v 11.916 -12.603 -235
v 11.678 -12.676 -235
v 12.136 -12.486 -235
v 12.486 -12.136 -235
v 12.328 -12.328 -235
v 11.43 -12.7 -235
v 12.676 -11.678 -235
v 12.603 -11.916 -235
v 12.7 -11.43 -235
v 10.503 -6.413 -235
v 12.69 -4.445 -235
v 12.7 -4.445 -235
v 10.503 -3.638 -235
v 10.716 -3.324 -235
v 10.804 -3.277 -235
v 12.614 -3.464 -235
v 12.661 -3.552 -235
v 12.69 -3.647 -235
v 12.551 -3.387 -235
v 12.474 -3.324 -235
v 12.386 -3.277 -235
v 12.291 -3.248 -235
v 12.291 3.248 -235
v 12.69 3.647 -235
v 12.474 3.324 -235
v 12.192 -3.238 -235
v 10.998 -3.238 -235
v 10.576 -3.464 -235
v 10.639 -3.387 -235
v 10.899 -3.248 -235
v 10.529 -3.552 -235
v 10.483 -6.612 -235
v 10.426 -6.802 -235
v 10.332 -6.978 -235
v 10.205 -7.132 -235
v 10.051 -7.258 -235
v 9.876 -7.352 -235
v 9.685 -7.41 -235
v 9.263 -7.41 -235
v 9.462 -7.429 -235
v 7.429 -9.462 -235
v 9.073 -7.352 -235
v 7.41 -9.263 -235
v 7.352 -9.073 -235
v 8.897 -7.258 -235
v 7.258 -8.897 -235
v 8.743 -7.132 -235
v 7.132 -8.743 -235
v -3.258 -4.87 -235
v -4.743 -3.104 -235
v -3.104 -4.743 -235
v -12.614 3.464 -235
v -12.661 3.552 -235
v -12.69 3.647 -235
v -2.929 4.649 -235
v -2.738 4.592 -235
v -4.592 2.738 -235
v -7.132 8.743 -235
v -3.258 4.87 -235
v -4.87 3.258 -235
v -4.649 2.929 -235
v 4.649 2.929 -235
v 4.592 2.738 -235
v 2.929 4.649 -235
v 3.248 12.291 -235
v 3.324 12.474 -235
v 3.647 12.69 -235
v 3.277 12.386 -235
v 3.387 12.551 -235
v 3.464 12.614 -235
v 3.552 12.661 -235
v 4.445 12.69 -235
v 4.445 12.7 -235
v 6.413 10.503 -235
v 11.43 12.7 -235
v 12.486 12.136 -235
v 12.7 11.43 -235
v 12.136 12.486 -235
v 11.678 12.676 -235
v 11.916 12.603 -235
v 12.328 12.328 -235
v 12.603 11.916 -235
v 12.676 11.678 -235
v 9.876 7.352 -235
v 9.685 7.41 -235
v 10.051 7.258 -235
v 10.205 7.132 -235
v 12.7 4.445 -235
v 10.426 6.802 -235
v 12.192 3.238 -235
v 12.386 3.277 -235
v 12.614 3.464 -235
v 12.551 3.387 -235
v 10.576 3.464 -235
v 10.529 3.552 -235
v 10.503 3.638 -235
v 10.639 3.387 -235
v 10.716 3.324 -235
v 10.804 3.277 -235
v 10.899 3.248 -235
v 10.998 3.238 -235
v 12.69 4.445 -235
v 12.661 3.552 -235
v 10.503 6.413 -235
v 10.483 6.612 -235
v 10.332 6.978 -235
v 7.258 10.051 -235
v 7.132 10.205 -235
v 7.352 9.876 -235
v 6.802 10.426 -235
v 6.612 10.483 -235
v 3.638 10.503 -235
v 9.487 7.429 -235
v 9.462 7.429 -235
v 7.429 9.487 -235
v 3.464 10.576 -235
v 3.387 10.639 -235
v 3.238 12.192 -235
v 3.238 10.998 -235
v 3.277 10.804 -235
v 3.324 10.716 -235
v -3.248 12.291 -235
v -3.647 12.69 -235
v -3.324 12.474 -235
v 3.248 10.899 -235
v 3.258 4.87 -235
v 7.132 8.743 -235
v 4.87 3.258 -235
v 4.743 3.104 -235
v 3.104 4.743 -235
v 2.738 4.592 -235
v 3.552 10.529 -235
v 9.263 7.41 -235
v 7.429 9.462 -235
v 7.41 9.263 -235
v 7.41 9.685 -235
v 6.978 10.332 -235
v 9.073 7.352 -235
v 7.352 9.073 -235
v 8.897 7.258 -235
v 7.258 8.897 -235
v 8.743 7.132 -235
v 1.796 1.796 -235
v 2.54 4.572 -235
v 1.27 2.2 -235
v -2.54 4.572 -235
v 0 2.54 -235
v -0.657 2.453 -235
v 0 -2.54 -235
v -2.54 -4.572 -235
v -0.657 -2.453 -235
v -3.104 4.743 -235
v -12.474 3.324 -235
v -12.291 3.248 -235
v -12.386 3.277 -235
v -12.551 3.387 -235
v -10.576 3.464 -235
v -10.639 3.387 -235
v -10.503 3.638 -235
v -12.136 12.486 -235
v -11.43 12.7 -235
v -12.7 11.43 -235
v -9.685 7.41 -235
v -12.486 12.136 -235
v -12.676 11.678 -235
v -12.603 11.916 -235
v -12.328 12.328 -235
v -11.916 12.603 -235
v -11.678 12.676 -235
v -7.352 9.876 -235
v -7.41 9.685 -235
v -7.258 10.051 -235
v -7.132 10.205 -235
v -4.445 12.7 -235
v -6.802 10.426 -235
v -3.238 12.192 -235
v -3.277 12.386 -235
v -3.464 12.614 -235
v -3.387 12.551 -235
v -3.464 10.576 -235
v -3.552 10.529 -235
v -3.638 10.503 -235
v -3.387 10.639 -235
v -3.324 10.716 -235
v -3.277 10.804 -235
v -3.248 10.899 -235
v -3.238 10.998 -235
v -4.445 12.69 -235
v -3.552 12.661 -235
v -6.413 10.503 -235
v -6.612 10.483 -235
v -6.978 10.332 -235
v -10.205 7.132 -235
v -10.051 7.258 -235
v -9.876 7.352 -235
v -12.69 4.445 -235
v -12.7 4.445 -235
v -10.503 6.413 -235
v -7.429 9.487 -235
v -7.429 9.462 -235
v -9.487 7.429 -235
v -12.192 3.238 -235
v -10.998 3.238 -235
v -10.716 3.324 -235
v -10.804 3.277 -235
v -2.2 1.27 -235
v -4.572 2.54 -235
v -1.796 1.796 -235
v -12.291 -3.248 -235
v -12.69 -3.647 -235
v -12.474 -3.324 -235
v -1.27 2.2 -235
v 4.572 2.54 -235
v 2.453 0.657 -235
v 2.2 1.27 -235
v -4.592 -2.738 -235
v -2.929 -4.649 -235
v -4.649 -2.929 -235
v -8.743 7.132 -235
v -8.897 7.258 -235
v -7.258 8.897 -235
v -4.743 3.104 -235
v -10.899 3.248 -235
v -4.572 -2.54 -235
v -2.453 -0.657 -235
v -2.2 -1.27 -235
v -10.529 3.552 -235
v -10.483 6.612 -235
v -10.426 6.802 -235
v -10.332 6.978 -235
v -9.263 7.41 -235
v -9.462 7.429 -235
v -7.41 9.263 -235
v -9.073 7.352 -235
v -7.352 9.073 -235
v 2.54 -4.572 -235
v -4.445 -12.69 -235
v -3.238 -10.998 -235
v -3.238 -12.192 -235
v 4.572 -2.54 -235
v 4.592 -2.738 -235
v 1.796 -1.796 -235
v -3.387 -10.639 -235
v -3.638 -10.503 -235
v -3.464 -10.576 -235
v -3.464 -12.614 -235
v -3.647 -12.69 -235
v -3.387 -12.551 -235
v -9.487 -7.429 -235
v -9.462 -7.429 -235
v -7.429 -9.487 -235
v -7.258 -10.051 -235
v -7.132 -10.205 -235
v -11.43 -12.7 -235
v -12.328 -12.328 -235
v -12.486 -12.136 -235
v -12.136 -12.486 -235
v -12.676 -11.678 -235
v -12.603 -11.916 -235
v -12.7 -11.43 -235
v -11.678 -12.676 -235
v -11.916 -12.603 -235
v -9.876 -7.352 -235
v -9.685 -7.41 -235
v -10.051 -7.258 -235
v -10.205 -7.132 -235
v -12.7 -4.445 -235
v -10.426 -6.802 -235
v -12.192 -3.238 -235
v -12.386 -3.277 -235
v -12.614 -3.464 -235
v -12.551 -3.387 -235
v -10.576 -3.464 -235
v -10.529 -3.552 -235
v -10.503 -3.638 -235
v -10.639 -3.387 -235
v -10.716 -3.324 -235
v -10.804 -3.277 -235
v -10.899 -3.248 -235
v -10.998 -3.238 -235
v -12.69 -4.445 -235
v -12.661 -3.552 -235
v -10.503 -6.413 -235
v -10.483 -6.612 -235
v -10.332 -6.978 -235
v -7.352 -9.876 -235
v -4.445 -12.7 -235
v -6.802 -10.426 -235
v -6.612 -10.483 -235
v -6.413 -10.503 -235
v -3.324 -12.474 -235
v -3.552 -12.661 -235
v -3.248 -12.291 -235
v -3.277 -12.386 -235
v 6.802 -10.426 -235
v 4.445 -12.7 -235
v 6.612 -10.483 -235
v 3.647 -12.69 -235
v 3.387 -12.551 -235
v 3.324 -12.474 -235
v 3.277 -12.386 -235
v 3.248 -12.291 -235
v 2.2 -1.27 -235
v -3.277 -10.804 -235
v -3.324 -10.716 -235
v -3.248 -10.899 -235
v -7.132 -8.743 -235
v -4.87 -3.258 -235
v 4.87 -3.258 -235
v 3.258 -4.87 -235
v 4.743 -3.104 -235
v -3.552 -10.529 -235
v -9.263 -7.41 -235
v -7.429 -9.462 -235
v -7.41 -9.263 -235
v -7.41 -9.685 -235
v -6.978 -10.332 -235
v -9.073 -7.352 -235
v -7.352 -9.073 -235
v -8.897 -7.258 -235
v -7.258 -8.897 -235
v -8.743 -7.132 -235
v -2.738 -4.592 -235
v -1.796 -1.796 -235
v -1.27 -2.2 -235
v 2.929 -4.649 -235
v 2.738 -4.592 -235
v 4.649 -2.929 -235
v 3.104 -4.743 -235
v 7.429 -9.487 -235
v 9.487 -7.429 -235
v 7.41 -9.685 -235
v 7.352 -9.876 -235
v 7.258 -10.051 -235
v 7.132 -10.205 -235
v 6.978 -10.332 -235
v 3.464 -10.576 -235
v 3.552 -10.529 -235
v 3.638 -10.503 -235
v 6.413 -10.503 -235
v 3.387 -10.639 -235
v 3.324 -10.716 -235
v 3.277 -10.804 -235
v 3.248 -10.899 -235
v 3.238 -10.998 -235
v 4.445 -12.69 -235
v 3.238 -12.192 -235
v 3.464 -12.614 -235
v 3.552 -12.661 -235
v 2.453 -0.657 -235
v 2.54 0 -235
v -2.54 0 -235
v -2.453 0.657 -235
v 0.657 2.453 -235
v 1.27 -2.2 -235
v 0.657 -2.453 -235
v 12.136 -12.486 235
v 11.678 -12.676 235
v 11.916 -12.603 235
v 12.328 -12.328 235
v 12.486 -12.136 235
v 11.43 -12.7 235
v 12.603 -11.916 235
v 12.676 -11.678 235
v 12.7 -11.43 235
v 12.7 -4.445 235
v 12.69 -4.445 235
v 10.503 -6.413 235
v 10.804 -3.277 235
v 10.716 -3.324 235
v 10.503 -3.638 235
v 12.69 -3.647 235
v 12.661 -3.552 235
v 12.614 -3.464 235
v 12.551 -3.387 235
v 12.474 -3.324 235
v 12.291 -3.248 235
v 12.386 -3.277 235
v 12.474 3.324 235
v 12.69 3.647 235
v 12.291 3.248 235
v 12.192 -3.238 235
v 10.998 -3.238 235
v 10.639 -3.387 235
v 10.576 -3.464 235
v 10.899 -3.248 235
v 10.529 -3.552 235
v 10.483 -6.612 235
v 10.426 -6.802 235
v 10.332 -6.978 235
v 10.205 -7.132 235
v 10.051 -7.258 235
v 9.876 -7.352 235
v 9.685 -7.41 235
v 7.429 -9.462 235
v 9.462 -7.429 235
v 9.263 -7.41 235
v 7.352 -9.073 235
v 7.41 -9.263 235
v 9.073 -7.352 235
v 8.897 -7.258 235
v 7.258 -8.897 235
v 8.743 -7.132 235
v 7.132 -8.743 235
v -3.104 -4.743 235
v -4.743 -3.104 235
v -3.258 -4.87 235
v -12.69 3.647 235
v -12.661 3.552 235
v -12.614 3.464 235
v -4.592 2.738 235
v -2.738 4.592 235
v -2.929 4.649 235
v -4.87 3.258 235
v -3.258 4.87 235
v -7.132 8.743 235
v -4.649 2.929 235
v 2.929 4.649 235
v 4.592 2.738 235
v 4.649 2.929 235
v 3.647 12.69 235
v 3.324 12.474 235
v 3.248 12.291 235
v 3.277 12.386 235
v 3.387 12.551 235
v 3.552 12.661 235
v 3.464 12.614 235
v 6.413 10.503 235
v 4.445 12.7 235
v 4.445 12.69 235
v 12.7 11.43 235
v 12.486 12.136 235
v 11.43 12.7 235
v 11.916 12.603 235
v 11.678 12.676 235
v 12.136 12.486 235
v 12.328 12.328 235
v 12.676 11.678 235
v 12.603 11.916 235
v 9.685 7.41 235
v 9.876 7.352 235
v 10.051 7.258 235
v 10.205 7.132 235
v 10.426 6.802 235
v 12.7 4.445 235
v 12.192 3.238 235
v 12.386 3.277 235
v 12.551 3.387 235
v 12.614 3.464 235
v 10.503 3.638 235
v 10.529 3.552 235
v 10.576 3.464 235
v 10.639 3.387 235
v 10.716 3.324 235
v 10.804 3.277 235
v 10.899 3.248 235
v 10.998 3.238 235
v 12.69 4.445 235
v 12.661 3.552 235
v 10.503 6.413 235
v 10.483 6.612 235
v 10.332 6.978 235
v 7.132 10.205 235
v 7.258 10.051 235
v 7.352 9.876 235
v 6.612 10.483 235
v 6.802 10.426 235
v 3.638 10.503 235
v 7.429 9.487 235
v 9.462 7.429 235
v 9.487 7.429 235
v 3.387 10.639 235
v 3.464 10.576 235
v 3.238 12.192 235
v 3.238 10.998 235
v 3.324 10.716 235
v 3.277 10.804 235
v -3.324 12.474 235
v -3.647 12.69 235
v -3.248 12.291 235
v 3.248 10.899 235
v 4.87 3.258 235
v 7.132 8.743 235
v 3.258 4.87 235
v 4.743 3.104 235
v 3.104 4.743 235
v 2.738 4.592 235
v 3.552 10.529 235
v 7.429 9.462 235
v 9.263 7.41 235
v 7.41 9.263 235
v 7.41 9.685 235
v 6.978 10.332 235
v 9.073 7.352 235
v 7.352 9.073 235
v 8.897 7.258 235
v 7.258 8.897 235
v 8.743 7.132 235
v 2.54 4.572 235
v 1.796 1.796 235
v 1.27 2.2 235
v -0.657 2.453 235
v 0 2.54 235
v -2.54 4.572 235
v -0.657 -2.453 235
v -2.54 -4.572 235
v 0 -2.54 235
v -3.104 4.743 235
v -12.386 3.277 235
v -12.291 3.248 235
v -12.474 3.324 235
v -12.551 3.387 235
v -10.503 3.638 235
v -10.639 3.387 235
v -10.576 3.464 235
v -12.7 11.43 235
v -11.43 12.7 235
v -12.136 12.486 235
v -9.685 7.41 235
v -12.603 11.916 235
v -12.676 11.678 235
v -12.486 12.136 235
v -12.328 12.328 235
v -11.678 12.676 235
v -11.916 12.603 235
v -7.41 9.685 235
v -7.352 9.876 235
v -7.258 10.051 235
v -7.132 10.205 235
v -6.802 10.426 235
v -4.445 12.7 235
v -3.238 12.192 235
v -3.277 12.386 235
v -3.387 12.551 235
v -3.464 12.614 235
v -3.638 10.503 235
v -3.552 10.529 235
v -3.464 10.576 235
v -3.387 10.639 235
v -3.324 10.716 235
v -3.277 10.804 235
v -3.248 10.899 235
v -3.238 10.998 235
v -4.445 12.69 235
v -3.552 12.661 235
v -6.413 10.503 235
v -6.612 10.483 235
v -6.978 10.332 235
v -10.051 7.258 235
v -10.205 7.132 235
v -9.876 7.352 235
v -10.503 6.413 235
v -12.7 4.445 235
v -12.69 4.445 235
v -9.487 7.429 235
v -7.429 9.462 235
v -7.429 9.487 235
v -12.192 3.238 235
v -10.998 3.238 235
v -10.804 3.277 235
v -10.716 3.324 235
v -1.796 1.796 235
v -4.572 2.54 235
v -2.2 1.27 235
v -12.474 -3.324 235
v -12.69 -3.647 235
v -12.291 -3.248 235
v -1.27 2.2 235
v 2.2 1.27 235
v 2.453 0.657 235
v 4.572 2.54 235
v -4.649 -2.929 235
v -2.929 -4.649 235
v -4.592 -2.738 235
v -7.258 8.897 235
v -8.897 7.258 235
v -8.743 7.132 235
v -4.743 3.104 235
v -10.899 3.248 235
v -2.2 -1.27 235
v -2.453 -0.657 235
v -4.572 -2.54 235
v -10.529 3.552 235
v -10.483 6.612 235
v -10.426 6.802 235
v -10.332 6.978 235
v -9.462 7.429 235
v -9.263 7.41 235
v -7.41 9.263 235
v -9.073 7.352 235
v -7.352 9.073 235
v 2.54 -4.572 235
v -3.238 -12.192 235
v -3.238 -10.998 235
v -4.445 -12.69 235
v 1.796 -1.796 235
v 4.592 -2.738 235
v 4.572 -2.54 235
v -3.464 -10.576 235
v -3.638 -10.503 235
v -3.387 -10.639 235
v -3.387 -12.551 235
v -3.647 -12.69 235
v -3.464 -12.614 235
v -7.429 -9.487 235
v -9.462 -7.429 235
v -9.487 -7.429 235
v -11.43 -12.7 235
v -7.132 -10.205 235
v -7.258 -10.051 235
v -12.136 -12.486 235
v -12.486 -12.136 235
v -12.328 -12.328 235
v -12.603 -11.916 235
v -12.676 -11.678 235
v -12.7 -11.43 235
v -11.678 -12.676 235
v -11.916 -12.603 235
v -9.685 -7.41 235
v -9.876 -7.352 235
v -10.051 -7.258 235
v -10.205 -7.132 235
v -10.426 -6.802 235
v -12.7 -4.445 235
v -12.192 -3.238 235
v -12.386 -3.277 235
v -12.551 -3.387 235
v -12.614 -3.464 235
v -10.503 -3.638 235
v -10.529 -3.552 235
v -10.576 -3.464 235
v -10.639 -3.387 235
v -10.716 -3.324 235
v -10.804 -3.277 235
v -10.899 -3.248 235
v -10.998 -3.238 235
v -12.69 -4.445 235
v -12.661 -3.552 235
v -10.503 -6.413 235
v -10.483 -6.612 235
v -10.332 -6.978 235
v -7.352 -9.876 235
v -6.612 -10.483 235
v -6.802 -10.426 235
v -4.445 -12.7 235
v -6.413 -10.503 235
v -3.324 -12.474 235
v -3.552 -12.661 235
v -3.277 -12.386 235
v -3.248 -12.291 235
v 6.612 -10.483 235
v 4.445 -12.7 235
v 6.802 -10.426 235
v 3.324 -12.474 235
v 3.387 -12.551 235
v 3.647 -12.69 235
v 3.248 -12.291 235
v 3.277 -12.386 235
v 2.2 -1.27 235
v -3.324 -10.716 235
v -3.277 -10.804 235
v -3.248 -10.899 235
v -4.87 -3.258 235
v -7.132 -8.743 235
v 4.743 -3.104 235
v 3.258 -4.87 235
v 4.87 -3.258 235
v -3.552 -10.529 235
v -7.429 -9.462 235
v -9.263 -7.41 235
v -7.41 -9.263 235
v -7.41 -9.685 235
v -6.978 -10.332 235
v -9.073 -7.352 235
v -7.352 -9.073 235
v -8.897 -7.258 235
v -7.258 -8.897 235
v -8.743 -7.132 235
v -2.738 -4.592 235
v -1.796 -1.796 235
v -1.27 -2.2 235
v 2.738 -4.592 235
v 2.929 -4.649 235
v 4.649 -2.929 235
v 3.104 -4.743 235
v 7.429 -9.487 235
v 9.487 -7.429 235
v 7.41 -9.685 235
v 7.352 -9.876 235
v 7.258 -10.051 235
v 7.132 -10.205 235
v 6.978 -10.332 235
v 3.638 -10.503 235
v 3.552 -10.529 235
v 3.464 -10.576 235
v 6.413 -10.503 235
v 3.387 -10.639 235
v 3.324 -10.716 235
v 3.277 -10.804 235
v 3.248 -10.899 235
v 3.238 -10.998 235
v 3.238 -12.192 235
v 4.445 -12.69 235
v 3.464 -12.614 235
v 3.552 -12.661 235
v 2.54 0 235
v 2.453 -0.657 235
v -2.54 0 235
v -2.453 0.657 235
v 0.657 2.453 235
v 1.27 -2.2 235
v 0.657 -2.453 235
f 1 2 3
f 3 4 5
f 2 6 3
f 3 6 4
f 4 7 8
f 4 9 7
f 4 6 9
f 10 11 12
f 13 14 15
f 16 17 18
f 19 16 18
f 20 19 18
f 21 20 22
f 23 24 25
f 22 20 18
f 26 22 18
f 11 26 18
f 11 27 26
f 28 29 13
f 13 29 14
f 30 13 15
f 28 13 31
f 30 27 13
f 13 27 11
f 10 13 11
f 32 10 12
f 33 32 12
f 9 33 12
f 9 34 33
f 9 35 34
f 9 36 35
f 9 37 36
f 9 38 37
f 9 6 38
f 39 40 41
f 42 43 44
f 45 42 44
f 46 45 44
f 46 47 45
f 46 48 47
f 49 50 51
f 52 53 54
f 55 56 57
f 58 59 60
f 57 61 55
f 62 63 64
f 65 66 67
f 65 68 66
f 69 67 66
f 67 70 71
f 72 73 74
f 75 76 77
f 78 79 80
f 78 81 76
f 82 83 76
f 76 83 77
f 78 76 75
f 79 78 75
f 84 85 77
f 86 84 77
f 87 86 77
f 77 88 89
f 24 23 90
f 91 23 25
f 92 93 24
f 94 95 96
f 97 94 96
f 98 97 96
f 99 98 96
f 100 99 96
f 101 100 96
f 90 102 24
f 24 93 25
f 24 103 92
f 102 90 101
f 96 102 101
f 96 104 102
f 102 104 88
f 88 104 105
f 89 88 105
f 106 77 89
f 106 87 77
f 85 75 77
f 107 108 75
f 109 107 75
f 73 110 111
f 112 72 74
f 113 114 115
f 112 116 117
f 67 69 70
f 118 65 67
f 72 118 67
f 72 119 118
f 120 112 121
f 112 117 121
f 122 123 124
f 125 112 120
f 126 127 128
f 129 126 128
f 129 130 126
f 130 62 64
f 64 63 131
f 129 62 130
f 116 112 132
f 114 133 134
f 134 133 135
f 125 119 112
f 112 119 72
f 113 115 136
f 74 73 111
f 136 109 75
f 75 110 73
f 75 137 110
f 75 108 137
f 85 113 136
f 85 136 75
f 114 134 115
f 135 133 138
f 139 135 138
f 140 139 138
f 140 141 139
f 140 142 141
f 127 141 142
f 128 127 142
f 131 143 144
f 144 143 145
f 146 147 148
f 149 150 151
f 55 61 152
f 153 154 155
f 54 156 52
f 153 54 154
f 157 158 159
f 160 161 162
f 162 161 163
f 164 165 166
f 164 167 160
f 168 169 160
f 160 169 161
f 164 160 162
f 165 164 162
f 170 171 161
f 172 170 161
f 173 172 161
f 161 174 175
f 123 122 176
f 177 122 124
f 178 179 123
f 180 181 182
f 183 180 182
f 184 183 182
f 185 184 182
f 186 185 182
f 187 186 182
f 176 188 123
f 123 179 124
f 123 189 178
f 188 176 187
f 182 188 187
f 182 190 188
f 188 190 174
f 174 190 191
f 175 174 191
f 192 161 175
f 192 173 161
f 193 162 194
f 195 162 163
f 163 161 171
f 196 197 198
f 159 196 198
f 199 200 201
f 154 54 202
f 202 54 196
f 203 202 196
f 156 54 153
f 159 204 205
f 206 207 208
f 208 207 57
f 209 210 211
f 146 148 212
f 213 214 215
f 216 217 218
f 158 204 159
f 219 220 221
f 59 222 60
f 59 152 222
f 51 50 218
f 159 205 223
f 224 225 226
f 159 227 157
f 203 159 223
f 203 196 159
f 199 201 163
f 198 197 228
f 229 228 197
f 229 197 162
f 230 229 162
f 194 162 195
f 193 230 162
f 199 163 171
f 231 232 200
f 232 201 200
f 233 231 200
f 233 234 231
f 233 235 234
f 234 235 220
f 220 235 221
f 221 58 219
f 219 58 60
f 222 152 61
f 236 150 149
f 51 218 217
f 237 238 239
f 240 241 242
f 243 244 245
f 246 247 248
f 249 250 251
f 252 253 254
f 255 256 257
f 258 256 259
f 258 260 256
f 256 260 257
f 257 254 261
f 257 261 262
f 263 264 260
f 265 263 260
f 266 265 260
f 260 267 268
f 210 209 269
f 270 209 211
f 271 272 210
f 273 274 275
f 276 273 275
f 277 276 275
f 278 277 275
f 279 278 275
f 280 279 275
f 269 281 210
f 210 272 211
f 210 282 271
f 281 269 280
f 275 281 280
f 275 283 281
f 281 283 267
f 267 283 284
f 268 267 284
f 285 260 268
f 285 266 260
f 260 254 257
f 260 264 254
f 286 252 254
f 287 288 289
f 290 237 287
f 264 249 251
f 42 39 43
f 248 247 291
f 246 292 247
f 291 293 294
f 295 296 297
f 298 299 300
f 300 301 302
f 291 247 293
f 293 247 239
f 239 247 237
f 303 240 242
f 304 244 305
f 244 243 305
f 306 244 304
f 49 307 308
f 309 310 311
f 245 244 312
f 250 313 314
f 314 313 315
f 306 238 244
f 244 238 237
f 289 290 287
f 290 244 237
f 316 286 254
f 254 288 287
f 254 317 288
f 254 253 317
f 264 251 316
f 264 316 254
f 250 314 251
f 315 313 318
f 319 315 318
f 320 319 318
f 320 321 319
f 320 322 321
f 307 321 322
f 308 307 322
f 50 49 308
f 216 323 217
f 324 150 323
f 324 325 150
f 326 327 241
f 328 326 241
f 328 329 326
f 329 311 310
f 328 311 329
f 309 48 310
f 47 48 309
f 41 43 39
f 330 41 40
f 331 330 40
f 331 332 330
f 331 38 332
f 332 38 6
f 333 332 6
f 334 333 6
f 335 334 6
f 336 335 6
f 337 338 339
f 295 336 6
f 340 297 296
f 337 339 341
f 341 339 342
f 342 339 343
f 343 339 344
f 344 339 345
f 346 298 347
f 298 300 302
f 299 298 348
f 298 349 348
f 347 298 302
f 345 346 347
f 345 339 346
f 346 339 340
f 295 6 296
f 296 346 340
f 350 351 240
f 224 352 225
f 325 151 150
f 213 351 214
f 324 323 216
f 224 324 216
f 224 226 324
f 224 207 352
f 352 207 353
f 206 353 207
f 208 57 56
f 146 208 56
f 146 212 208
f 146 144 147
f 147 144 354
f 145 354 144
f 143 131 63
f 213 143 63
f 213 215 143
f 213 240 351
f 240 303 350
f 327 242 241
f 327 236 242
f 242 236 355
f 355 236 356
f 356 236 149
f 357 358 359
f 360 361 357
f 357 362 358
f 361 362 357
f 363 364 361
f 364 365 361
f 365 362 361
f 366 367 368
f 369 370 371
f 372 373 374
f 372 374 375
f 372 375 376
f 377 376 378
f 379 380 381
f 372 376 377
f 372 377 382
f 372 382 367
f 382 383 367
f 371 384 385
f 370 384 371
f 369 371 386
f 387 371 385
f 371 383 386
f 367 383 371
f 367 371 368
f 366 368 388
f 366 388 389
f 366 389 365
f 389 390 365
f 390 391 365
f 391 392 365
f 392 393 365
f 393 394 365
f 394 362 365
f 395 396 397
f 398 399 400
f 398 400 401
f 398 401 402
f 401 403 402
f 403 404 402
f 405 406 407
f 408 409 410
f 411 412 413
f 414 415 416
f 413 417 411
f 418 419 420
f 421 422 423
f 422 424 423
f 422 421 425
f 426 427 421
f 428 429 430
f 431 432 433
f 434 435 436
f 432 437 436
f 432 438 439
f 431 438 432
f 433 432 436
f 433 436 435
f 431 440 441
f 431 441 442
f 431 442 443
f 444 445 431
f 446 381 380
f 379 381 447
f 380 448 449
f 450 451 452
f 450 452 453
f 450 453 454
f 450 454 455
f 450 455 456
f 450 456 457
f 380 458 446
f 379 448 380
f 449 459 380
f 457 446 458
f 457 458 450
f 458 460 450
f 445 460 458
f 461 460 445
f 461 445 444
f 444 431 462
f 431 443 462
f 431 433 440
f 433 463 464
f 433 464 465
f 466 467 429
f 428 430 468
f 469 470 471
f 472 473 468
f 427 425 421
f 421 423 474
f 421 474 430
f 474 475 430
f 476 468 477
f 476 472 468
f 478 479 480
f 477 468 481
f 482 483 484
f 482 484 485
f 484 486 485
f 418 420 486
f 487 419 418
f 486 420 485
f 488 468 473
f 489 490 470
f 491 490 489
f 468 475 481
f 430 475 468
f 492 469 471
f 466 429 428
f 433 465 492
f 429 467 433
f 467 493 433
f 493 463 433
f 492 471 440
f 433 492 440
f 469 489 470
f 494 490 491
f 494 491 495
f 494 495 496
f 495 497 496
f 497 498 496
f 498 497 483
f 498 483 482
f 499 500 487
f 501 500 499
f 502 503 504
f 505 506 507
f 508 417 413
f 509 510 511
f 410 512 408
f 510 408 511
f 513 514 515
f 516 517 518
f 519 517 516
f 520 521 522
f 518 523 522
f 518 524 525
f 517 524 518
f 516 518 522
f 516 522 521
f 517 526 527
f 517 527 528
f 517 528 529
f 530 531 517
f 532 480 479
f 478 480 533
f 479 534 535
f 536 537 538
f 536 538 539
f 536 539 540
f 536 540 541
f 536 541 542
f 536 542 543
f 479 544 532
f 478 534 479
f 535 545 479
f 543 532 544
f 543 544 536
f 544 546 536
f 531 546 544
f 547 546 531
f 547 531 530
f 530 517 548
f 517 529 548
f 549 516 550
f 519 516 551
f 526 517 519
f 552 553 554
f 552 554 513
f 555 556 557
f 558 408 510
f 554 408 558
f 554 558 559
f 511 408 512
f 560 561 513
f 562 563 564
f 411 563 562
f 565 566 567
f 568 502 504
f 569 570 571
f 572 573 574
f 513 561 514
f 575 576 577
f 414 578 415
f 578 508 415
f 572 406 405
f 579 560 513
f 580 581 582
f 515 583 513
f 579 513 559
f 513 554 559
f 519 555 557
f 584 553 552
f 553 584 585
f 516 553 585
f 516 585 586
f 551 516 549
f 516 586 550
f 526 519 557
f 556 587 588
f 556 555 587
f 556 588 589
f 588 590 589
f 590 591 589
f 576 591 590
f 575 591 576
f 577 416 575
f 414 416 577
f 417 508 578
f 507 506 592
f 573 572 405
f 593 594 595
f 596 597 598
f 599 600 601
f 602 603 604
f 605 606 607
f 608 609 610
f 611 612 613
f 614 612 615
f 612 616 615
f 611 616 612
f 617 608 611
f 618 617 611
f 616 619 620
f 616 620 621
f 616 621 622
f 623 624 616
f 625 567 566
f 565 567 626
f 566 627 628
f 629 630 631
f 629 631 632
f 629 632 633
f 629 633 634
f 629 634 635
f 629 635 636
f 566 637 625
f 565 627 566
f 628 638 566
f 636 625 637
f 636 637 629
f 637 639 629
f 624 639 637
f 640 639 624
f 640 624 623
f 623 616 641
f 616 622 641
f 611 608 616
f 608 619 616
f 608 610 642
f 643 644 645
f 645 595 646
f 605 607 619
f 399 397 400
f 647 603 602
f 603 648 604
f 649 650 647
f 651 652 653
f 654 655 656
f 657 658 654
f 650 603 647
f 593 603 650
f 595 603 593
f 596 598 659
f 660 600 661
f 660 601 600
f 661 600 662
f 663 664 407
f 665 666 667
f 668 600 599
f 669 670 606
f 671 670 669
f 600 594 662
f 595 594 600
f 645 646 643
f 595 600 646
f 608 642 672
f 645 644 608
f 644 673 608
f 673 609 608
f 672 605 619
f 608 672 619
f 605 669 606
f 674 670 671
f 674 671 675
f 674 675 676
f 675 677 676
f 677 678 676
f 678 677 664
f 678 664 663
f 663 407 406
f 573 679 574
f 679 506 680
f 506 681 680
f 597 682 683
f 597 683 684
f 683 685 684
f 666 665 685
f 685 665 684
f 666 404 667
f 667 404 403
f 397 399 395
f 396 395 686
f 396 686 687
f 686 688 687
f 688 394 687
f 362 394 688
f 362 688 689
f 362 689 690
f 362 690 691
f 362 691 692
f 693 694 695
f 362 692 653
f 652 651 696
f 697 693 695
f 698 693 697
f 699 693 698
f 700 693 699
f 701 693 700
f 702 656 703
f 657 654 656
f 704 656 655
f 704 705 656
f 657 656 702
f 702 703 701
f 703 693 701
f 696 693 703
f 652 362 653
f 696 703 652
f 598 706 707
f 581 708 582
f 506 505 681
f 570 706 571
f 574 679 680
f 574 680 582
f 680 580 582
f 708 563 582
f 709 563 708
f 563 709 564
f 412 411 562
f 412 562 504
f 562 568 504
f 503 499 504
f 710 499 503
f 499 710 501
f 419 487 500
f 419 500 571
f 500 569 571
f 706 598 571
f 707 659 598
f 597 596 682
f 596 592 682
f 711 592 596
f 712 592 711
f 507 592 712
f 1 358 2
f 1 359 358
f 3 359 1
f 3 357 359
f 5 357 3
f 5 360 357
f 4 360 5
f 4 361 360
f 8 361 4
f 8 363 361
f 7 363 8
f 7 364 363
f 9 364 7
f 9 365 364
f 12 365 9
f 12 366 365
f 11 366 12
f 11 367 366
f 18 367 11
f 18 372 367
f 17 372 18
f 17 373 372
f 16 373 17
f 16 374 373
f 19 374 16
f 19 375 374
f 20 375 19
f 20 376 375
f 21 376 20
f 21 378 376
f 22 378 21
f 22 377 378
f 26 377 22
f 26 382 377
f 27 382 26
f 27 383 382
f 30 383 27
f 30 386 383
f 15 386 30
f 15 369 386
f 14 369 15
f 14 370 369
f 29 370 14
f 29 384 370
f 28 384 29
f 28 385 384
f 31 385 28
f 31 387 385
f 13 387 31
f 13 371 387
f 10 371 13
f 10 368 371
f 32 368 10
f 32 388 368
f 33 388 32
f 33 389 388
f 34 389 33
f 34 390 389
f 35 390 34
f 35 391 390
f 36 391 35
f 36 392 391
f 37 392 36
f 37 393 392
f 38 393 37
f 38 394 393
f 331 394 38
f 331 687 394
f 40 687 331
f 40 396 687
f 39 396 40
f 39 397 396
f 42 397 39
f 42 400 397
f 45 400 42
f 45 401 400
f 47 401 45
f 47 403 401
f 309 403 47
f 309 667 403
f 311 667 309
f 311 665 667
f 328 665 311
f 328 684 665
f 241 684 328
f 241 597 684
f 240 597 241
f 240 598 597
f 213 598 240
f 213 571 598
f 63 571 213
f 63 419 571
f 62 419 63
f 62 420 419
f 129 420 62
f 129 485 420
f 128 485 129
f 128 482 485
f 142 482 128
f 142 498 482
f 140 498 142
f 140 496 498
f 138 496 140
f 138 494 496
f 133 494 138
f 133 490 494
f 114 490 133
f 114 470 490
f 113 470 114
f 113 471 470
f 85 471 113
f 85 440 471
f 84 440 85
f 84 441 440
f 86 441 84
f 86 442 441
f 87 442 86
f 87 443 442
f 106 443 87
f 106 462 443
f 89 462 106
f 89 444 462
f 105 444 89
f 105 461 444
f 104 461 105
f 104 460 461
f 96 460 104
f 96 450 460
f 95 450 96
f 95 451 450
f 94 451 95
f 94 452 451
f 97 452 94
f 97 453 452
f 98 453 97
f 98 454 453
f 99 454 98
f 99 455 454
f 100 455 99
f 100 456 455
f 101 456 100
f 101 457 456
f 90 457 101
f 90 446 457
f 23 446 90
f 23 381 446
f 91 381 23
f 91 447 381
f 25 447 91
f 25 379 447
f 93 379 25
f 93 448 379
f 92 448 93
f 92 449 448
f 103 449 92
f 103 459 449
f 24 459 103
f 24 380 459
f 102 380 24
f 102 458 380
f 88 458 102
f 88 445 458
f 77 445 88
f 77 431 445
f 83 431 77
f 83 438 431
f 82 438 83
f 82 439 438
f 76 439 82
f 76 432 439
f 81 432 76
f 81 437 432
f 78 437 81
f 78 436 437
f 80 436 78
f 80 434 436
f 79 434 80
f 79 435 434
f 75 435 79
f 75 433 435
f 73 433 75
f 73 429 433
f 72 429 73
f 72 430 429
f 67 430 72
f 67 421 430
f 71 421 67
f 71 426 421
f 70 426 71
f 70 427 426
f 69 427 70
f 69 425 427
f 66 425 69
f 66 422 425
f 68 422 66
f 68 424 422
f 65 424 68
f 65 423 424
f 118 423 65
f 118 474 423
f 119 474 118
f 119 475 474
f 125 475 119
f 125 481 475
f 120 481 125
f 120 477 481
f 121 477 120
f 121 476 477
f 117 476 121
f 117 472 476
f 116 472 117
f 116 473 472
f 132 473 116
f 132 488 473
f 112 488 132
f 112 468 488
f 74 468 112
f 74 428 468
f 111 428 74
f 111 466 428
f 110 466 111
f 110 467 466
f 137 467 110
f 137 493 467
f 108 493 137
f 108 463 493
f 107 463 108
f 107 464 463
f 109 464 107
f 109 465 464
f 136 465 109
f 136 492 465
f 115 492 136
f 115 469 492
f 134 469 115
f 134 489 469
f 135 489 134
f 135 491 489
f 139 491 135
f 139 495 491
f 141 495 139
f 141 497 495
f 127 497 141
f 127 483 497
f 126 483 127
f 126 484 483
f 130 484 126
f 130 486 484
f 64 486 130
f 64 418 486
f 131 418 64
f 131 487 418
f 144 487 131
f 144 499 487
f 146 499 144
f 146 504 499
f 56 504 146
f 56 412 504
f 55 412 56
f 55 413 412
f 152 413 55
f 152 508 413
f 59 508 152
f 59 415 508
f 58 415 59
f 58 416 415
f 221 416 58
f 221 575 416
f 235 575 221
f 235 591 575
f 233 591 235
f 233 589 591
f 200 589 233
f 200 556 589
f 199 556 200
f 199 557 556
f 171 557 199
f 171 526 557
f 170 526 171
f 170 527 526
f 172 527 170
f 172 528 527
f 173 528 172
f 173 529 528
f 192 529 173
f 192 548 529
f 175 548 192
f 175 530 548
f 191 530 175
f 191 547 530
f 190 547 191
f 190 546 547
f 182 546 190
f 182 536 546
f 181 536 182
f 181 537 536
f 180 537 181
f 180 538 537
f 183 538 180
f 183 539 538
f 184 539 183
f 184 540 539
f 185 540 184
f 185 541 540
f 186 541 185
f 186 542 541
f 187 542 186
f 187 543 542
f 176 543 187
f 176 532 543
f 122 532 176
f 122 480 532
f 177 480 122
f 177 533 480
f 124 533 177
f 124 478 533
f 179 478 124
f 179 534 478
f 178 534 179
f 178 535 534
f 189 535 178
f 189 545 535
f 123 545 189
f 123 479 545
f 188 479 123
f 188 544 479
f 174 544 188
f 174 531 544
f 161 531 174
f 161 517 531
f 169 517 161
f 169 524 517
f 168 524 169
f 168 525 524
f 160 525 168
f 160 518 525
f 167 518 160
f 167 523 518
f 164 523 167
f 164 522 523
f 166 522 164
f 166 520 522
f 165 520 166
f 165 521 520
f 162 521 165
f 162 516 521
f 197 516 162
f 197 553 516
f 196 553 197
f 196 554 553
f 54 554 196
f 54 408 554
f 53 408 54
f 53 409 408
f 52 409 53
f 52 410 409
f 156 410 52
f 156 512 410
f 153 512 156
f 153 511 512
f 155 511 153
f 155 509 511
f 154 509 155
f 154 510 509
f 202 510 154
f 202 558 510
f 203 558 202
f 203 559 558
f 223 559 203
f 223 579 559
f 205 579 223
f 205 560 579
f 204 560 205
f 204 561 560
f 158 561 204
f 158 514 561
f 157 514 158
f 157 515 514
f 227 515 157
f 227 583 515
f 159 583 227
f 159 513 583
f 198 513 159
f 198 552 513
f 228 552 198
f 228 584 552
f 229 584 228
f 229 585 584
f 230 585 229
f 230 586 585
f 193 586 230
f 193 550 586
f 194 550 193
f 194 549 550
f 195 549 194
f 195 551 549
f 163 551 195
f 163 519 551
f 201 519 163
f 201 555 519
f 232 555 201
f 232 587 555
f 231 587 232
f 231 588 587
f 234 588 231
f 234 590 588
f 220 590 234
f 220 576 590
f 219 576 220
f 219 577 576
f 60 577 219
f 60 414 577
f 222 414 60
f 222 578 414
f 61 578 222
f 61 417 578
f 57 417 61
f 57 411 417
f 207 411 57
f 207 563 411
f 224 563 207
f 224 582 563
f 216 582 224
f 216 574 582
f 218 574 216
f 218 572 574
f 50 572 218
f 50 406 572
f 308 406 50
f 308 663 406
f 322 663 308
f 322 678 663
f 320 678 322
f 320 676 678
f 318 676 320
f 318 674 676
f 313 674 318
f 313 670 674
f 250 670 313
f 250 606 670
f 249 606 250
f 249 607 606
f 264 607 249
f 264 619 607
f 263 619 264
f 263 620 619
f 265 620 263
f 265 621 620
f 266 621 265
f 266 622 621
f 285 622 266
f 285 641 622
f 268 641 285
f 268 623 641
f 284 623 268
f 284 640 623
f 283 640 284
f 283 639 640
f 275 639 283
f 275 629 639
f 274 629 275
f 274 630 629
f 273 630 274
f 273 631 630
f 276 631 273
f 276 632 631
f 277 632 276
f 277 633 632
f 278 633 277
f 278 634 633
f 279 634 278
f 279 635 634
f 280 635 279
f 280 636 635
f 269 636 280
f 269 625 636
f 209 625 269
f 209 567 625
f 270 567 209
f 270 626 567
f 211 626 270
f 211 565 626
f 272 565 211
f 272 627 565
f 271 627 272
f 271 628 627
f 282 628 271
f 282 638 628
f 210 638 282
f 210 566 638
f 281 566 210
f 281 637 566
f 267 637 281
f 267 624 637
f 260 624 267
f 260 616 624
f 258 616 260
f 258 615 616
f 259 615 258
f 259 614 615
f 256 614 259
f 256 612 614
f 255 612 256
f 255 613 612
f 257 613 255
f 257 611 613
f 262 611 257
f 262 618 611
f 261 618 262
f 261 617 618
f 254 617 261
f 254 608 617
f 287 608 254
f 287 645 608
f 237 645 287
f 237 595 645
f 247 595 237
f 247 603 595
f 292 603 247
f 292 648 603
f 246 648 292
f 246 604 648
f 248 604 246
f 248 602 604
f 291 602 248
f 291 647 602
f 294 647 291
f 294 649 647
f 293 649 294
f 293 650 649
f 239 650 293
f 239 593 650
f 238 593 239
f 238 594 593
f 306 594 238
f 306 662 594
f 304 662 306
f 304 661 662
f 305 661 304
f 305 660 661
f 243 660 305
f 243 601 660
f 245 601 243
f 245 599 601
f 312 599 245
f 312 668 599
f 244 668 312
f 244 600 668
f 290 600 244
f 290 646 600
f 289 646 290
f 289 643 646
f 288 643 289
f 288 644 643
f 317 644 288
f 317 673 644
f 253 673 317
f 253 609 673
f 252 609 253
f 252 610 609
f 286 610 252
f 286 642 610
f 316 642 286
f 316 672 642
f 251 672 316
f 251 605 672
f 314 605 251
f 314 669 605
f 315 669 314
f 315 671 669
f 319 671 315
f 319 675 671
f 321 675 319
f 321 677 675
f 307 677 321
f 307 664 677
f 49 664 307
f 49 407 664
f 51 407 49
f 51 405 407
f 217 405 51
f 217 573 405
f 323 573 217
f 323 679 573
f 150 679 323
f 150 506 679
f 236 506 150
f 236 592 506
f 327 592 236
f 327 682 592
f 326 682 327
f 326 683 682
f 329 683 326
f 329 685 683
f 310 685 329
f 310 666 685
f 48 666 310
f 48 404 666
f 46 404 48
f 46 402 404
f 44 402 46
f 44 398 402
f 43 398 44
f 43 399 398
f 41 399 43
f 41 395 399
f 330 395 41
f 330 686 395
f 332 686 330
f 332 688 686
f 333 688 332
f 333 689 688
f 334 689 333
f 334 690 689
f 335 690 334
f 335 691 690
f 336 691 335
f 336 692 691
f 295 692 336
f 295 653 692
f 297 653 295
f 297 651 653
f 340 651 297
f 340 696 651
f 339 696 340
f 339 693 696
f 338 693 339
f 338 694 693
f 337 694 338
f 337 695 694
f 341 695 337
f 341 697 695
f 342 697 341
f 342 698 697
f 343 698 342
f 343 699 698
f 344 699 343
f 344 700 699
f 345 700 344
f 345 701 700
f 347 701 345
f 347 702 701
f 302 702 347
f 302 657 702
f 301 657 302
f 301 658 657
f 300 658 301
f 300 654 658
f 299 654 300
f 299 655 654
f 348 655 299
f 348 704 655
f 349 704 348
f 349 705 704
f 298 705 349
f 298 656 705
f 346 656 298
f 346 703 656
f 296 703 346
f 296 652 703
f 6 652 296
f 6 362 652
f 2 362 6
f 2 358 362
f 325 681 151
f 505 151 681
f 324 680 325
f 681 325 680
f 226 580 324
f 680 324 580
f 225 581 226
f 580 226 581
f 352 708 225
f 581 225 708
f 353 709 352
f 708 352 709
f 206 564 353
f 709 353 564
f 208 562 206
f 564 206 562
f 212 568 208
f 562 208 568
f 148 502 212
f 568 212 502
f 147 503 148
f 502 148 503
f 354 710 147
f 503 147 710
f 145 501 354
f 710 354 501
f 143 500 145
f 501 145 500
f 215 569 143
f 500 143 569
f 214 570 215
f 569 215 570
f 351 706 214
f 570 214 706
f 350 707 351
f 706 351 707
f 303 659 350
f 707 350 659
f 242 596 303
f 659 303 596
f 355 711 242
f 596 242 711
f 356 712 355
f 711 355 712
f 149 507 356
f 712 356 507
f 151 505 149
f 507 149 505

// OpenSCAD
/*
*   Generic library for fractional t-slot extrusions.
*   Rev. 1
*
*  Creative Commons Share Alike 3.0
*  Copyright (c) 2013 David Lee Miller
* 
*/

minkR_TS = 0.04*25.4;   // minkowski radius for the t-slot
minkR_IC = 0.075*25.4;   // minkowski radius for the inner cutout
minkR_PF = 0.05*25.4;   // minkowski radius for the profile corners

1010Profile(470);
//1020Profile(100);
//1030Profile(100);
//2020Profile(100);
//2040Profile(100);


module fillet(rad){
	translate([-rad,-rad,0])
	difference(){
		translate([0,0,0]) square([rad+0.01,rad+0.01]);
		circle(r=rad,center=true,$fn=32);
	}
}

module insideCutout(){
	minkowski(){
		translate([0,0,0]) circle(r=minkR_IC,center=true,$fn=32);
		hull(){
			square([0.2*25.4-minkR_IC,0.645*25.4-2*minkR_IC],center=true);
			square([0.8*25.4-2*minkR_IC,0.001*25.4],center=true);
		}
	}
}

module doubleCutout(){
	union(){
		minkowski(){
			translate([0,0,0]) circle(r=minkR_IC,center=true,$fn=32);
			union(){
			rotate([0,0,0]) hull(){
				translate([-0.5*25.4,0,0]) hull(){
					square([0.2*25.4-minkR_IC,0.645*25.4-2*minkR_IC],center=true);
					square([0.8*25.4-2*minkR_IC,0.001*25.4],center=true);
				}
				translate([0.5*25.4,0,0]) hull(){
					square([0.2*25.4-minkR_IC,0.645*25.4-2*minkR_IC],center=true);
					square([0.8*25.4-2*minkR_IC,0.001*25.4],center=true);
				}
			}
			rotate([0,0,90]) hull(){
				translate([-0.5*25.4,0,0]) hull(){
					square([0.2*25.4-minkR_IC,0.645*25.4-2*minkR_IC],center=true);
					square([0.8*25.4-2*minkR_IC,0.001*25.4],center=true);
				}
				translate([0.5*25.4,0,0]) hull(){
					square([0.2*25.4-minkR_IC,0.645*25.4-2*minkR_IC],center=true);
					square([0.8*25.4-2*minkR_IC,0.001*25.4],center=true);
				}
			}}
		}
		rotate([0,0,0]) translate([-0.645*25.4/2,-0.645*25.4/2,0]) fillet(minkR_IC);
		rotate([0,0,180]) translate([-0.645*25.4/2,-0.645*25.4/2,0]) fillet(minkR_IC);
		rotate([0,0,90]) translate([-0.645*25.4/2,-0.645*25.4/2,0]) fillet(minkR_IC);
		rotate([0,0,-90]) translate([-0.645*25.4/2,-0.645*25.4/2,0]) fillet(minkR_IC);
	}
}

module tSlot(){
	union(){
		translate([minkR_TS,0,0])
		minkowski(){
			translate([0,0,0]) circle(r=minkR_TS,center=true,$fn=32);
			hull(){
				square([0.001*25.4,0.585*25.4-2*minkR_TS],center=true);
				translate([(0.233*25.4-2*minkR_TS)/2,0,0]) square([0.233*25.4-2*minkR_TS,0.2*25.4],center=true);
			}
		}
	translate([-0.255*25.4/2+0.01,0,0]) square(0.255*25.4,center=true);
	translate([-0.35*25.4/2-0.087*25.4+0.01,0,0]) square(0.35*25.4,center=true);
	translate([0,-0.255*25.4/2,0]) fillet(minkR_TS/2);
	translate([-0.087*25.4,-.255*25.4/2,0]) rotate([0,0,90]) fillet(minkR_TS/2);
	scale([1,-1,1]) translate([0,-0.255*25.4/2,0]) fillet(minkR_TS/2);
	scale([1,-1,1]) translate([-0.087*25.4,-.255*25.4/2,0]) rotate([0,0,90]) fillet(minkR_TS/2);
	}
}

module 1010Profile(height){
	linear_extrude(height=height,center=true)
	union(){
	difference(){
		minkowski(){
			translate([0,0,0]) circle(r=minkR_PF,center=true,$fn=32);
			square([1*25.4-2*minkR_PF,1*25.4-2*minkR_PF],center=true);
		}
		translate([0,0,0]) circle(r=0.2*25.4/2,$fn=24);
		translate([-0.5*25.4+0.087*25.4,0,0]) tSlot();
		rotate([0,0,180]) translate([-0.5*25.4+0.087*25.4,0,0]) tSlot();
		translate([0,-0.5*25.4+0.087*25.4,0]) rotate([0,0,90]) tSlot();
		translate([0,0.5*25.4-0.087*25.4,0]) rotate([0,0,-90]) tSlot();
	}}
}

module 1020Profile(height){
	linear_extrude(height=height,center=true)
	difference(){
		minkowski(){
			translate([0,0,0]) circle(r=minkR_PF,center=true,$fn=32);
			square([1*25.4-2*minkR_PF,2*25.4-2*minkR_PF],center=true);
		}
		translate([0,0.5*25.4,0]) circle(r=0.2*25.4/2,$fn=24);
		translate([0,-0.5*25.4,0]) circle(r=0.2*25.4/2,$fn=24);
		translate([0,0,0]) insideCutout();
		translate([-0.5*25.4+0.087*25.4,0.5*25.4,0]) tSlot();
		rotate([0,0,180]) translate([-0.5*25.4+0.087*25.4,0.5*25.4,0]) tSlot();
		translate([-0.5*25.4+0.087*25.4,-0.5*25.4,0]) tSlot();
		rotate([0,0,180]) translate([-0.5*25.4+0.087*25.4,-0.5*25.4,0]) tSlot();
		translate([0,-1*25.4+0.087*25.4,0]) rotate([0,0,90]) tSlot();
		translate([0,1*25.4-0.087*25.4,0]) rotate([0,0,-90]) tSlot();
	}
}

module 1030Profile(height){
	linear_extrude(height=height,center=true)
	difference(){
		minkowski(){
			translate([0,0,0]) circle(r=minkR_PF,center=true,$fn=32);
			square([1*25.4-2*minkR_PF,3*25.4-2*minkR_PF],center=true);
		}
		translate([0,0,0]) circle(r=0.2*25.4/2,$fn=24);
		translate([0,1*25.4,0]) circle(r=0.2*25.4/2,$fn=24);
		translate([0,-1*25.4,0]) circle(r=0.2*25.4/2,$fn=24);
		translate([0,-0.5*25.4,0]) insideCutout();
		translate([0,0.5*25.4,0]) insideCutout();
		translate([-0.5*25.4+0.087*25.4,0,0]) tSlot();
		rotate([0,0,180]) translate([-0.5*25.4+0.087*25.4,0,0]) tSlot();
		translate([-0.5*25.4+0.087*25.4,1*25.4,0]) tSlot();
		rotate([0,0,180]) translate([-0.5*25.4+0.087*25.4,1*25.4,0]) tSlot();
		translate([-0.5*25.4+0.087*25.4,-1*25.4,0]) tSlot();
		rotate([0,0,180]) translate([-0.5*25.4+0.087*25.4,-1*25.4,0]) tSlot();
		translate([0,-1.5*25.4+0.087*25.4,0]) rotate([0,0,90]) tSlot();
		translate([0,1.5*25.4-0.087*25.4,0]) rotate([0,0,-90]) tSlot();
	}
}

module 2020Profile(height){
	linear_extrude(height=height,center=true)
	difference(){
		minkowski(){
			translate([0,0,0]) circle(r=minkR_PF,center=true,$fn=32);
			square([2*25.4-2*minkR_PF,2*25.4-2*minkR_PF],center=true);
		}
		translate([0.5*25.4,0.5*25.4,0]) circle(r=0.2*25.4/2,$fn=24);
		translate([-0.5*25.4,0.5*25.4,0]) circle(r=0.2*25.4/2,$fn=24);
		translate([0.5*25.4,-0.5*25.4,0]) circle(r=0.2*25.4/2,$fn=24);
		translate([-0.5*25.4,-0.5*25.4,0]) circle(r=0.2*25.4/2,$fn=24);
		translate([0,0,0]) doubleCutout();
		translate([-1*25.4+0.087*25.4,0.5*25.4,0]) tSlot();
		rotate([0,0,180]) translate([-1*25.4+0.087*25.4,0.5*25.4,0]) tSlot();
		translate([-1*25.4+0.087*25.4,-0.5*25.4,0]) tSlot();
		rotate([0,0,180]) translate([-1*25.4+0.087*25.4,-0.5*25.4,0]) tSlot();
		translate([-0.5*25.4,1*25.4-0.087*25.4,0]) rotate([0,0,-90]) tSlot();
		rotate([0,0,180]) translate([-0.5*25.4,1*25.4-0.087*25.4,0]) rotate([0,0,-90]) tSlot();
		translate([0.5*25.4,1*25.4-0.087*25.4,0]) rotate([0,0,-90]) tSlot();
		rotate([0,0,180]) translate([0.5*25.4,1*25.4-0.087*25.4,0]) rotate([0,0,-90]) tSlot();
	}
}

module 2040Profile(height){
	linear_extrude(height=height,center=true)
	difference(){
		minkowski(){
			translate([0,0,0]) circle(r=minkR_PF,center=true,$fn=32);
			square([2*25.4-2*minkR_PF,4*25.4-2*minkR_PF],center=true);
		}
		translate([0.5*25.4,1.5*25.4,0]) circle(r=0.2*25.4/2,$fn=24);
		translate([-0.5*25.4,1.5*25.4,0]) circle(r=0.2*25.4/2,$fn=24);
		translate([0.5*25.4,0.5*25.4,0]) circle(r=0.2*25.4/2,$fn=24);
		translate([-0.5*25.4,0.5*25.4,0]) circle(r=0.2*25.4/2,$fn=24);
		translate([0.5*25.4,-1.5*25.4,0]) circle(r=0.2*25.4/2,$fn=24);
		translate([-0.5*25.4,-1.5*25.4,0]) circle(r=0.2*25.4/2,$fn=24);
		translate([0.5*25.4,-0.5*25.4,0]) circle(r=0.2*25.4/2,$fn=24);
		translate([-0.5*25.4,-0.5*25.4,0]) circle(r=0.2*25.4/2,$fn=24);
		translate([0,1*25.4,0]) doubleCutout();
		translate([0,-1*25.4,0]) doubleCutout();
		translate([0.5*25.4,0,0]) insideCutout();
		translate([-0.5*25.4,0,0]) insideCutout();
		translate([-1*25.4+0.087*25.4,0.5*25.4,0]) tSlot();
		rotate([0,0,180]) translate([-1*25.4+0.087*25.4,0.5*25.4,0]) tSlot();
		translate([-1*25.4+0.087*25.4,-0.5*25.4,0]) tSlot();
		rotate([0,0,180]) translate([-1*25.4+0.087*25.4,-0.5*25.4,0]) tSlot();
		translate([-1*25.4+0.087*25.4,1.5*25.4,0]) tSlot();
		rotate([0,0,180]) translate([-1*25.4+0.087*25.4,1.5*25.4,0]) tSlot();
		translate([-1*25.4+0.087*25.4,-1.5*25.4,0]) tSlot();
		rotate([0,0,180]) translate([-1*25.4+0.087*25.4,-1.5*25.4,0]) tSlot();
		translate([-0.5*25.4,2*25.4-0.087*25.4,0]) rotate([0,0,-90]) tSlot();
		rotate([0,0,180]) translate([-0.5*25.4,2*25.4-0.087*25.4,0]) rotate([0,0,-90]) tSlot();
		translate([0.5*25.4,2*25.4-0.087*25.4,0]) rotate([0,0,-90]) tSlot();
		rotate([0,0,180]) translate([0.5*25.4,2*25.4-0.087*25.4,0]) rotate([0,0,-90]) tSlot();
	}
}
